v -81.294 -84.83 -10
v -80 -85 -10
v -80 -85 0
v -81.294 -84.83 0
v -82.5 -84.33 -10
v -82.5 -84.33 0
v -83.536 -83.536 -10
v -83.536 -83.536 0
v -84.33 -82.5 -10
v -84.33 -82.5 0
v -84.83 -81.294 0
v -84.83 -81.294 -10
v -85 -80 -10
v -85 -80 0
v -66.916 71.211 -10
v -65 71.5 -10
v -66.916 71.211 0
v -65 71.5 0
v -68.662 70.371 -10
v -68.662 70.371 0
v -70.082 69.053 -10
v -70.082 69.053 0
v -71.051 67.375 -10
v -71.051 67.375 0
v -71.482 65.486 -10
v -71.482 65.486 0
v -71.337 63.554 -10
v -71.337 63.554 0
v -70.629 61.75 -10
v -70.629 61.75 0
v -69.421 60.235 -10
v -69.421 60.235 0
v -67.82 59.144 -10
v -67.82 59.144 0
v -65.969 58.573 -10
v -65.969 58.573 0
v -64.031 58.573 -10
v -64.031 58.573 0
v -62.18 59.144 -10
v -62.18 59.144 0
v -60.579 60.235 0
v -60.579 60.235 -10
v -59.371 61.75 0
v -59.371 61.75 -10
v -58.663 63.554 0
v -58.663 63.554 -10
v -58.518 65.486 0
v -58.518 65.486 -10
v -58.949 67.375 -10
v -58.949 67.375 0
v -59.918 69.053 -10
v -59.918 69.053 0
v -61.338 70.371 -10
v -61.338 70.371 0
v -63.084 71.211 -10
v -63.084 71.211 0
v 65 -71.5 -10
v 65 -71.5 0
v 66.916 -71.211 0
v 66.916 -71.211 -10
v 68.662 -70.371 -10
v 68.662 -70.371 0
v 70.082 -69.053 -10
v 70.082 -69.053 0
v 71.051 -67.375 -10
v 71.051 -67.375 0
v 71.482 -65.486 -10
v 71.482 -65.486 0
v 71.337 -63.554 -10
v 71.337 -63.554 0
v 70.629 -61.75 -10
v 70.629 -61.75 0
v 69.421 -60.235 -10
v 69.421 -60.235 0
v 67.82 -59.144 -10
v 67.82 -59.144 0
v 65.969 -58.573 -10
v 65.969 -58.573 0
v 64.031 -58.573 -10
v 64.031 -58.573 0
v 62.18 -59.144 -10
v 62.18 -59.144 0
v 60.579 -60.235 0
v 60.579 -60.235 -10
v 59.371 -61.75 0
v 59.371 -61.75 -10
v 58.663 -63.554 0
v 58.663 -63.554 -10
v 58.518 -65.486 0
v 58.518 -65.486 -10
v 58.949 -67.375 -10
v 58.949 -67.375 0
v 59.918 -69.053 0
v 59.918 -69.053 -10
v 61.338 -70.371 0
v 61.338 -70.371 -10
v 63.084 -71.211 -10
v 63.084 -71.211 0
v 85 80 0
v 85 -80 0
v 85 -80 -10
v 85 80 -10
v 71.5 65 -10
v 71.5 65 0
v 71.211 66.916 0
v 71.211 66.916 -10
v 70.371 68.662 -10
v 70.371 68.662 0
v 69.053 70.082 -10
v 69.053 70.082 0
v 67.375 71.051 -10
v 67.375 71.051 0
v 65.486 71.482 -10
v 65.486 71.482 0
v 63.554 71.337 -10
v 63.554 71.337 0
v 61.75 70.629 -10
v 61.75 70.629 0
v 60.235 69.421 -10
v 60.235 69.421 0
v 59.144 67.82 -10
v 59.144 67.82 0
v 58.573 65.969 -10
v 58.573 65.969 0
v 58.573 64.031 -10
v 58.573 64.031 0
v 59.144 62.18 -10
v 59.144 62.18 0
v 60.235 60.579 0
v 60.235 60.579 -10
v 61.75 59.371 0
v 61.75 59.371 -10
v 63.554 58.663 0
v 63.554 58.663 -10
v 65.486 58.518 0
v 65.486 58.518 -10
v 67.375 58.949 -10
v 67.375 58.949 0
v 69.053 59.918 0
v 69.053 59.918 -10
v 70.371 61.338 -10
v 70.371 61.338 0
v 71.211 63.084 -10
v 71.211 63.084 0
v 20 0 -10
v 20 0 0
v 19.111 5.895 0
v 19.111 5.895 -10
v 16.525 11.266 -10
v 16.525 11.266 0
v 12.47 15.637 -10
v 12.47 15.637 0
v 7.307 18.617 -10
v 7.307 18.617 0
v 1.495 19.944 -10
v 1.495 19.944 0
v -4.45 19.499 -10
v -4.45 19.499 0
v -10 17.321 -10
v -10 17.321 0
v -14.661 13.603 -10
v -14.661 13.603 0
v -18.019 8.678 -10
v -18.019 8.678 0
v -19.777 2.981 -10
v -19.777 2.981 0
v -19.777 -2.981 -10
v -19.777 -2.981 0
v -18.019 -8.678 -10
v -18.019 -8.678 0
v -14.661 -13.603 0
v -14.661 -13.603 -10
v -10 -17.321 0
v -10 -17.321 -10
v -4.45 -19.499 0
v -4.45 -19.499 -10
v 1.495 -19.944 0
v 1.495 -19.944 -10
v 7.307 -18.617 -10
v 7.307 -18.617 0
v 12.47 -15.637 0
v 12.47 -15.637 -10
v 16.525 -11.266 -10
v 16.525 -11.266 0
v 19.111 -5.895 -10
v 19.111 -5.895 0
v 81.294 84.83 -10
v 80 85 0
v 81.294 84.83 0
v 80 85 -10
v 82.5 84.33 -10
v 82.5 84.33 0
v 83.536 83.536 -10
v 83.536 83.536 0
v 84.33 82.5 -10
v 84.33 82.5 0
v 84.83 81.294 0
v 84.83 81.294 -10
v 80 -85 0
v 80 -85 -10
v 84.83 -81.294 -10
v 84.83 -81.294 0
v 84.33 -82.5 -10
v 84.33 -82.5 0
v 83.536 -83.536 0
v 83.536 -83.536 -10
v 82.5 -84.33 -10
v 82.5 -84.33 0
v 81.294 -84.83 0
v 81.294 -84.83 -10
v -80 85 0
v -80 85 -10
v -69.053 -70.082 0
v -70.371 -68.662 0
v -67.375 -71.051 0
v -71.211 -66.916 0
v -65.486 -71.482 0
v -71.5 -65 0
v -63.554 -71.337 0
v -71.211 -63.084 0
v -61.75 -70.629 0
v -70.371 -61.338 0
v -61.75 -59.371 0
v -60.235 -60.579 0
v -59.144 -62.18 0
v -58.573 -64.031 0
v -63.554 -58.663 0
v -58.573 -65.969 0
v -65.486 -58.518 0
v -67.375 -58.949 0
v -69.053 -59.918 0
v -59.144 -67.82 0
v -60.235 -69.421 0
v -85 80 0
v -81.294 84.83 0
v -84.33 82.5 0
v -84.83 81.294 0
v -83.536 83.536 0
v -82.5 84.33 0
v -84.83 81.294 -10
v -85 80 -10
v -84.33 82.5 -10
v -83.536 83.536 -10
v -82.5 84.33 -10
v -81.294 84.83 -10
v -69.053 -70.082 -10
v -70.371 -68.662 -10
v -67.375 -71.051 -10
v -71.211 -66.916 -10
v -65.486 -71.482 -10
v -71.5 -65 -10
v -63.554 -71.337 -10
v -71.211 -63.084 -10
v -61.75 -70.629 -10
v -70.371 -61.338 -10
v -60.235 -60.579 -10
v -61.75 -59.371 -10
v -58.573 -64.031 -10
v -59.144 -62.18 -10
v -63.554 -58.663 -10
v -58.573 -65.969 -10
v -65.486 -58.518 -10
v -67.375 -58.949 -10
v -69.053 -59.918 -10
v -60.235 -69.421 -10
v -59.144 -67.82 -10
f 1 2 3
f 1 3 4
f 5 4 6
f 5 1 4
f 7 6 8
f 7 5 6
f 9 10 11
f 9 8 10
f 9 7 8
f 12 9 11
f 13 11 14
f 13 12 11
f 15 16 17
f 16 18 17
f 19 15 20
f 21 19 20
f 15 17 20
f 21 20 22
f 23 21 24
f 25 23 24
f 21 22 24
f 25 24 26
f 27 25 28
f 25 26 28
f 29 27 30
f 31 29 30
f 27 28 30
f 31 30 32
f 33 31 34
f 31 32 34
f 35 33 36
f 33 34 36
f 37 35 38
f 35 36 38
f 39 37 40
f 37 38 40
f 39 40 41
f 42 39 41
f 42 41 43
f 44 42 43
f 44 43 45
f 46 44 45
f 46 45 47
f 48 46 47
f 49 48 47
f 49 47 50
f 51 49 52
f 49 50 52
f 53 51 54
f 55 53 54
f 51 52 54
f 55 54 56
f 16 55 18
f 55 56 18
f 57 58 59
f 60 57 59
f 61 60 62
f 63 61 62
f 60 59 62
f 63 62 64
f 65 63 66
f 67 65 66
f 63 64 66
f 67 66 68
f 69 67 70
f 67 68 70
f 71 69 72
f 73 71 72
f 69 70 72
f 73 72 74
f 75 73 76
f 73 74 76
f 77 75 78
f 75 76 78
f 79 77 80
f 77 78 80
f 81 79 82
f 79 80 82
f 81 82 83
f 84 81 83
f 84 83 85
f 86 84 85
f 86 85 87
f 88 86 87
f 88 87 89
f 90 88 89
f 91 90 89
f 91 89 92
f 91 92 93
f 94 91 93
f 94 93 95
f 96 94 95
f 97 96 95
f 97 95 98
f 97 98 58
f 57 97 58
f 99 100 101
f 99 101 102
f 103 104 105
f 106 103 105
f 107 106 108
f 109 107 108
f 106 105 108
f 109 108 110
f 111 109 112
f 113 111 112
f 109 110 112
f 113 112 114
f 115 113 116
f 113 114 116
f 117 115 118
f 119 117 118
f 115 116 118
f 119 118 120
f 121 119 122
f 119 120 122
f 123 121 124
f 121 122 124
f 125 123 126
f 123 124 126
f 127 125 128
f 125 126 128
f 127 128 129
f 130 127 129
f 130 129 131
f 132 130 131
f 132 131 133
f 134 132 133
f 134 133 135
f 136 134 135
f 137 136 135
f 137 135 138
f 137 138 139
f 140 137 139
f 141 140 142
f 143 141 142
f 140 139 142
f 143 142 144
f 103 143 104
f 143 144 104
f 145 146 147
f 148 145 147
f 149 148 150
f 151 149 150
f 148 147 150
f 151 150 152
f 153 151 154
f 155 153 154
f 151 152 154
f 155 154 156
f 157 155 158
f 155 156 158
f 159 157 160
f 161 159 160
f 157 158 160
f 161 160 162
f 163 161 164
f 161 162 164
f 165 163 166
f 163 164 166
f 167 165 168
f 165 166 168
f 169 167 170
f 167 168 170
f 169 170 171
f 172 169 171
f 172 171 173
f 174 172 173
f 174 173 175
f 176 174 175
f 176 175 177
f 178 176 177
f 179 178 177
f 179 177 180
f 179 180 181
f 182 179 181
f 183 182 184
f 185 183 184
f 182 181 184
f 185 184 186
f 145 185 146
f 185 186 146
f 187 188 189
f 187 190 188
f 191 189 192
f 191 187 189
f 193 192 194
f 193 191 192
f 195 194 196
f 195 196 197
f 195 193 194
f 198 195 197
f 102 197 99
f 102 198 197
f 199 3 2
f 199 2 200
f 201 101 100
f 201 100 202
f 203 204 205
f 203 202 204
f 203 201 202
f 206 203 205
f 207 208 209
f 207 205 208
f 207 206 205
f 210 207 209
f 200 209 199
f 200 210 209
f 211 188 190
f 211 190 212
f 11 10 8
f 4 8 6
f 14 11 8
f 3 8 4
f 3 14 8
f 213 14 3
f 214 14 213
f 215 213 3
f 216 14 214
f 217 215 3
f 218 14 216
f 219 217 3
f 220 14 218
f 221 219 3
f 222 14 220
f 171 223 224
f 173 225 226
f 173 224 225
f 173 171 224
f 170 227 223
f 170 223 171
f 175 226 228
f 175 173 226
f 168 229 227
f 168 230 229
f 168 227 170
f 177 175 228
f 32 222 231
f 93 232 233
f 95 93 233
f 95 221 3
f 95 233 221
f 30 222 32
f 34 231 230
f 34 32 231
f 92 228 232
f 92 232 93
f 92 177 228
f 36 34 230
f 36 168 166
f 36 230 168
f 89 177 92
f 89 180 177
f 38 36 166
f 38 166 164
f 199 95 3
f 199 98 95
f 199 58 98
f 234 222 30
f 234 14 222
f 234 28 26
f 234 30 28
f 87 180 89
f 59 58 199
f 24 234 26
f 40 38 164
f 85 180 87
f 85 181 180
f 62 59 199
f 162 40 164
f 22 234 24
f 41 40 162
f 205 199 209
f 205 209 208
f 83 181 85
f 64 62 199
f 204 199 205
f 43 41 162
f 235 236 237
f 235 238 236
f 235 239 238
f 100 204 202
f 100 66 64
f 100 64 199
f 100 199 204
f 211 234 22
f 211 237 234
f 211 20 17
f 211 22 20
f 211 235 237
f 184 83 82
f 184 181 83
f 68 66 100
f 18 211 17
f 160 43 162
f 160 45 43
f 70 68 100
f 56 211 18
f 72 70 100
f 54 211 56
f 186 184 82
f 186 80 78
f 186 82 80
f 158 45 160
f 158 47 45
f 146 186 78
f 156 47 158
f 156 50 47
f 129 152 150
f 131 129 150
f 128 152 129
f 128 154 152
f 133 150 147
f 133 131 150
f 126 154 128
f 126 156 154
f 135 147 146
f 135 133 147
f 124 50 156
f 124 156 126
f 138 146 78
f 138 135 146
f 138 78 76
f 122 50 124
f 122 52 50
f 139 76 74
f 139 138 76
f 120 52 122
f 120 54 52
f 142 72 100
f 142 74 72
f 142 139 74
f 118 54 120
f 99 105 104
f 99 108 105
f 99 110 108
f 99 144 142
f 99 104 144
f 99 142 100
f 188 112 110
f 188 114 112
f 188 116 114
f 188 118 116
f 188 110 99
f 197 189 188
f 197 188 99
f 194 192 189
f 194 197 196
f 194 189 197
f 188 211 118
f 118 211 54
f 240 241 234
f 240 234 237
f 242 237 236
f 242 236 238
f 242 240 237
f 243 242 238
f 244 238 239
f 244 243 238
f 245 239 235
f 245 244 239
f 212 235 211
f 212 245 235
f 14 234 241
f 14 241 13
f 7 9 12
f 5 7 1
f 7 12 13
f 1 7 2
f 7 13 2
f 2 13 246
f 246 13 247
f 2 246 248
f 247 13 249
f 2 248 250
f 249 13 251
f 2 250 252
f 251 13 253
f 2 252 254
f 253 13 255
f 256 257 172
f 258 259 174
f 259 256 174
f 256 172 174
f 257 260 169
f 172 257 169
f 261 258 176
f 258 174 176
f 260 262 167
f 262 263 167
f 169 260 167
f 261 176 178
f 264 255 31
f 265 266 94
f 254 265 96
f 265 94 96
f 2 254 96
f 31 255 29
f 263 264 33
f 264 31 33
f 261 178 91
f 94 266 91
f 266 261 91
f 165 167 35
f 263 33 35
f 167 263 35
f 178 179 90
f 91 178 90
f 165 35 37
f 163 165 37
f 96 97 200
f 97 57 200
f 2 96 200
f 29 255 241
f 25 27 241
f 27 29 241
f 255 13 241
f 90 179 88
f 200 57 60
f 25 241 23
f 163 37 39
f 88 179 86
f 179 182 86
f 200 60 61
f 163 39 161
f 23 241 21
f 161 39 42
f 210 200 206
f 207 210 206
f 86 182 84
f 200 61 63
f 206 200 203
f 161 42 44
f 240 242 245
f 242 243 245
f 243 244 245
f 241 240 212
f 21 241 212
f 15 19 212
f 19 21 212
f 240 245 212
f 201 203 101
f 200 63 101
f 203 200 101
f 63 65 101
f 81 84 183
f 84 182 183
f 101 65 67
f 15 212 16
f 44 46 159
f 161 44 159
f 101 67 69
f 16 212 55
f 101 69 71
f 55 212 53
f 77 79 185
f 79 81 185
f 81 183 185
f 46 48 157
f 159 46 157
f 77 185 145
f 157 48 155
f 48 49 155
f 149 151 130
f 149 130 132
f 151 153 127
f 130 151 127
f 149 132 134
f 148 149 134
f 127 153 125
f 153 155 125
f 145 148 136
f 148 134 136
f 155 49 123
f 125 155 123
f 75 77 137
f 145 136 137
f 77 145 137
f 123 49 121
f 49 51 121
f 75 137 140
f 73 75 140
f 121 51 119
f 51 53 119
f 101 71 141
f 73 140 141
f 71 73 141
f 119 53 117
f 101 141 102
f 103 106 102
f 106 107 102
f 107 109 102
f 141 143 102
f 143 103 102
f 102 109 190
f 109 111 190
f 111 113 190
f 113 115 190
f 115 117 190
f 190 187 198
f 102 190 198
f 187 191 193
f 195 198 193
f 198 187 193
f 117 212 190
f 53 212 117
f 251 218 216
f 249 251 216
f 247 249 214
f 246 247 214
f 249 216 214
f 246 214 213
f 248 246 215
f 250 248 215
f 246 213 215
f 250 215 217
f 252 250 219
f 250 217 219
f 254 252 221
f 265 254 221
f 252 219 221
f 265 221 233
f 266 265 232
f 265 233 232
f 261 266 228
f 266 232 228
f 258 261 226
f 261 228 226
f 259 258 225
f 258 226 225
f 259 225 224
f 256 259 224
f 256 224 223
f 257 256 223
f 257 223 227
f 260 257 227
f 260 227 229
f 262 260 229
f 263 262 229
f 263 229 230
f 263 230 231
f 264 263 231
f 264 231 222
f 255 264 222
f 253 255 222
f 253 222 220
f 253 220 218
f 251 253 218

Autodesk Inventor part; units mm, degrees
ref_plane "YZ Plane" through (0, 0, 0) normal (1, 0, 0) x (0, 1, 0)
ref_plane "XZ Plane" through (0, 0, 0) normal (0, 1, 0) x (-1, 0, 0)
ref_plane "XY Plane" through (0, 0, 0) normal (0, 0, 1) x (1, 0, 0)
sketch "Sketch1" plane through (0, 0, 0) normal (0, 0, 1) x (1, 0, 0)
  circle A0 centre (0, 0) radius 20
  line L0 (-85, -85) -> (85, -85)
  line L1 (85, -85) -> (85, 85)
  line L2 (85, 85) -> (-85, 85)
  line L3 (-85, 85) -> (-85, -85)
  line L4 (-85, -85) -> (85, 85) construction
  line L5 (85, -85) -> (-85, 85) construction
  dimension "d0" = 40
  dimension "d13" = 170
extrude "Extrusion1" add sketch "Sketch1" against normal blind 10
sketch "Sketch4" plane through (0, 0, 0) normal (0, 0, 1) x (1, 0, 0)
  line L0 (85, 85) -> (-85, 85) projected
  line L1 (-85, -85) -> (85, -85) projected
  line L2 (0, 0) -> (85, 85) construction
  circle A0 centre (65, 65) radius 6.5
  circle A1 centre (0, 0) radius 91.9239 construction
  dimension "d22" = 183.8478
  dimension "d23" = 13
  dimension "d24" = 65
  dimension "d25" = 65
extrude "Extrusion2" cut sketch "Sketch4" against normal through all
pattern_circular "Circular Pattern2" count 4 over 360 about axis through (0, 0, 0) along (0, 0, -1) of "Extrusion2"
fillet "Fillet1" radius 5 4 edges at (85, -85, -5) (-85, -85, -5) (-85, 85, -5) (85, 85, -5)
equation "\"BendReliefDepth\" = 0.5 * Thickness"
equation "\"Thickness\" = 10"
properties part number "NVPH-343 cup head flange"
